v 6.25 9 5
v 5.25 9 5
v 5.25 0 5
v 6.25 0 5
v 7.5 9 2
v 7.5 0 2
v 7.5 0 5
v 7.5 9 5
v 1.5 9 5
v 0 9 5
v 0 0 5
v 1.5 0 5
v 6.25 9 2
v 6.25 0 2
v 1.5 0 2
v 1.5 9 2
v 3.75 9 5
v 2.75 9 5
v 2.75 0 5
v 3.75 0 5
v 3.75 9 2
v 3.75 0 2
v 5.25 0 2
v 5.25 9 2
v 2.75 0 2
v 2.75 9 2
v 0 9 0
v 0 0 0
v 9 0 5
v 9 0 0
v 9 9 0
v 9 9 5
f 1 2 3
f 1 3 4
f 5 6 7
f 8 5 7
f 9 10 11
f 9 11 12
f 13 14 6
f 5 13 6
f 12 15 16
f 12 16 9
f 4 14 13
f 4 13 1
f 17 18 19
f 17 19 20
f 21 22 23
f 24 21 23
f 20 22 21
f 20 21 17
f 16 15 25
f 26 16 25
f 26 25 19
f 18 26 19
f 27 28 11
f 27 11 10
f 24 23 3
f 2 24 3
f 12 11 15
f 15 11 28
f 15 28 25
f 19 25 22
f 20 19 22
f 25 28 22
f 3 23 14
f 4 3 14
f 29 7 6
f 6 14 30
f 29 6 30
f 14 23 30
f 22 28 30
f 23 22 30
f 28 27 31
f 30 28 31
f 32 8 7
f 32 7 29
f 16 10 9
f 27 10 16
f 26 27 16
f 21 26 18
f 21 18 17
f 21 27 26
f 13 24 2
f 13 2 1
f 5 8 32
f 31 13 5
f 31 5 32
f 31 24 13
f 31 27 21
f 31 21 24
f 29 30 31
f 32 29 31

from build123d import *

# Parameters (mm, degrees)
SKETCH_1_W          = 9
SKETCH_1_H          = 9
EXTRUDE_1_DEPTH     = 5
SKETCH_2_W          = 1.25
SKETCH_2_H          = 3
SKETCH_2_W_2        = 0.75
CUT_EXTRUDE_1_DEPTH = 10


with BuildPart() as part:
    # 草图1 → 凸台-拉伸1 (new body)
    with BuildSketch(Plane.XY):
        with Locations((4.5, 4.5)):
            Rectangle(SKETCH_1_W, SKETCH_1_H)
    extrude(amount=EXTRUDE_1_DEPTH)

    # 草图2 → 切除-拉伸1 (cut)
    with BuildSketch(Plane.XZ):
        with Locations((2.125, 3.5)):
            Rectangle(SKETCH_2_W, SKETCH_2_H)
        with Locations((4.125, 3.5)):
            Rectangle(SKETCH_2_W_2, SKETCH_2_H)
        with Locations((4.875, 3.5)):
            Rectangle(SKETCH_2_W_2, SKETCH_2_H)
        with Locations((6.875, 3.5)):
            Rectangle(SKETCH_2_W, SKETCH_2_H)
    extrude(amount=-CUT_EXTRUDE_1_DEPTH, mode=Mode.SUBTRACT)


solid = part.part
